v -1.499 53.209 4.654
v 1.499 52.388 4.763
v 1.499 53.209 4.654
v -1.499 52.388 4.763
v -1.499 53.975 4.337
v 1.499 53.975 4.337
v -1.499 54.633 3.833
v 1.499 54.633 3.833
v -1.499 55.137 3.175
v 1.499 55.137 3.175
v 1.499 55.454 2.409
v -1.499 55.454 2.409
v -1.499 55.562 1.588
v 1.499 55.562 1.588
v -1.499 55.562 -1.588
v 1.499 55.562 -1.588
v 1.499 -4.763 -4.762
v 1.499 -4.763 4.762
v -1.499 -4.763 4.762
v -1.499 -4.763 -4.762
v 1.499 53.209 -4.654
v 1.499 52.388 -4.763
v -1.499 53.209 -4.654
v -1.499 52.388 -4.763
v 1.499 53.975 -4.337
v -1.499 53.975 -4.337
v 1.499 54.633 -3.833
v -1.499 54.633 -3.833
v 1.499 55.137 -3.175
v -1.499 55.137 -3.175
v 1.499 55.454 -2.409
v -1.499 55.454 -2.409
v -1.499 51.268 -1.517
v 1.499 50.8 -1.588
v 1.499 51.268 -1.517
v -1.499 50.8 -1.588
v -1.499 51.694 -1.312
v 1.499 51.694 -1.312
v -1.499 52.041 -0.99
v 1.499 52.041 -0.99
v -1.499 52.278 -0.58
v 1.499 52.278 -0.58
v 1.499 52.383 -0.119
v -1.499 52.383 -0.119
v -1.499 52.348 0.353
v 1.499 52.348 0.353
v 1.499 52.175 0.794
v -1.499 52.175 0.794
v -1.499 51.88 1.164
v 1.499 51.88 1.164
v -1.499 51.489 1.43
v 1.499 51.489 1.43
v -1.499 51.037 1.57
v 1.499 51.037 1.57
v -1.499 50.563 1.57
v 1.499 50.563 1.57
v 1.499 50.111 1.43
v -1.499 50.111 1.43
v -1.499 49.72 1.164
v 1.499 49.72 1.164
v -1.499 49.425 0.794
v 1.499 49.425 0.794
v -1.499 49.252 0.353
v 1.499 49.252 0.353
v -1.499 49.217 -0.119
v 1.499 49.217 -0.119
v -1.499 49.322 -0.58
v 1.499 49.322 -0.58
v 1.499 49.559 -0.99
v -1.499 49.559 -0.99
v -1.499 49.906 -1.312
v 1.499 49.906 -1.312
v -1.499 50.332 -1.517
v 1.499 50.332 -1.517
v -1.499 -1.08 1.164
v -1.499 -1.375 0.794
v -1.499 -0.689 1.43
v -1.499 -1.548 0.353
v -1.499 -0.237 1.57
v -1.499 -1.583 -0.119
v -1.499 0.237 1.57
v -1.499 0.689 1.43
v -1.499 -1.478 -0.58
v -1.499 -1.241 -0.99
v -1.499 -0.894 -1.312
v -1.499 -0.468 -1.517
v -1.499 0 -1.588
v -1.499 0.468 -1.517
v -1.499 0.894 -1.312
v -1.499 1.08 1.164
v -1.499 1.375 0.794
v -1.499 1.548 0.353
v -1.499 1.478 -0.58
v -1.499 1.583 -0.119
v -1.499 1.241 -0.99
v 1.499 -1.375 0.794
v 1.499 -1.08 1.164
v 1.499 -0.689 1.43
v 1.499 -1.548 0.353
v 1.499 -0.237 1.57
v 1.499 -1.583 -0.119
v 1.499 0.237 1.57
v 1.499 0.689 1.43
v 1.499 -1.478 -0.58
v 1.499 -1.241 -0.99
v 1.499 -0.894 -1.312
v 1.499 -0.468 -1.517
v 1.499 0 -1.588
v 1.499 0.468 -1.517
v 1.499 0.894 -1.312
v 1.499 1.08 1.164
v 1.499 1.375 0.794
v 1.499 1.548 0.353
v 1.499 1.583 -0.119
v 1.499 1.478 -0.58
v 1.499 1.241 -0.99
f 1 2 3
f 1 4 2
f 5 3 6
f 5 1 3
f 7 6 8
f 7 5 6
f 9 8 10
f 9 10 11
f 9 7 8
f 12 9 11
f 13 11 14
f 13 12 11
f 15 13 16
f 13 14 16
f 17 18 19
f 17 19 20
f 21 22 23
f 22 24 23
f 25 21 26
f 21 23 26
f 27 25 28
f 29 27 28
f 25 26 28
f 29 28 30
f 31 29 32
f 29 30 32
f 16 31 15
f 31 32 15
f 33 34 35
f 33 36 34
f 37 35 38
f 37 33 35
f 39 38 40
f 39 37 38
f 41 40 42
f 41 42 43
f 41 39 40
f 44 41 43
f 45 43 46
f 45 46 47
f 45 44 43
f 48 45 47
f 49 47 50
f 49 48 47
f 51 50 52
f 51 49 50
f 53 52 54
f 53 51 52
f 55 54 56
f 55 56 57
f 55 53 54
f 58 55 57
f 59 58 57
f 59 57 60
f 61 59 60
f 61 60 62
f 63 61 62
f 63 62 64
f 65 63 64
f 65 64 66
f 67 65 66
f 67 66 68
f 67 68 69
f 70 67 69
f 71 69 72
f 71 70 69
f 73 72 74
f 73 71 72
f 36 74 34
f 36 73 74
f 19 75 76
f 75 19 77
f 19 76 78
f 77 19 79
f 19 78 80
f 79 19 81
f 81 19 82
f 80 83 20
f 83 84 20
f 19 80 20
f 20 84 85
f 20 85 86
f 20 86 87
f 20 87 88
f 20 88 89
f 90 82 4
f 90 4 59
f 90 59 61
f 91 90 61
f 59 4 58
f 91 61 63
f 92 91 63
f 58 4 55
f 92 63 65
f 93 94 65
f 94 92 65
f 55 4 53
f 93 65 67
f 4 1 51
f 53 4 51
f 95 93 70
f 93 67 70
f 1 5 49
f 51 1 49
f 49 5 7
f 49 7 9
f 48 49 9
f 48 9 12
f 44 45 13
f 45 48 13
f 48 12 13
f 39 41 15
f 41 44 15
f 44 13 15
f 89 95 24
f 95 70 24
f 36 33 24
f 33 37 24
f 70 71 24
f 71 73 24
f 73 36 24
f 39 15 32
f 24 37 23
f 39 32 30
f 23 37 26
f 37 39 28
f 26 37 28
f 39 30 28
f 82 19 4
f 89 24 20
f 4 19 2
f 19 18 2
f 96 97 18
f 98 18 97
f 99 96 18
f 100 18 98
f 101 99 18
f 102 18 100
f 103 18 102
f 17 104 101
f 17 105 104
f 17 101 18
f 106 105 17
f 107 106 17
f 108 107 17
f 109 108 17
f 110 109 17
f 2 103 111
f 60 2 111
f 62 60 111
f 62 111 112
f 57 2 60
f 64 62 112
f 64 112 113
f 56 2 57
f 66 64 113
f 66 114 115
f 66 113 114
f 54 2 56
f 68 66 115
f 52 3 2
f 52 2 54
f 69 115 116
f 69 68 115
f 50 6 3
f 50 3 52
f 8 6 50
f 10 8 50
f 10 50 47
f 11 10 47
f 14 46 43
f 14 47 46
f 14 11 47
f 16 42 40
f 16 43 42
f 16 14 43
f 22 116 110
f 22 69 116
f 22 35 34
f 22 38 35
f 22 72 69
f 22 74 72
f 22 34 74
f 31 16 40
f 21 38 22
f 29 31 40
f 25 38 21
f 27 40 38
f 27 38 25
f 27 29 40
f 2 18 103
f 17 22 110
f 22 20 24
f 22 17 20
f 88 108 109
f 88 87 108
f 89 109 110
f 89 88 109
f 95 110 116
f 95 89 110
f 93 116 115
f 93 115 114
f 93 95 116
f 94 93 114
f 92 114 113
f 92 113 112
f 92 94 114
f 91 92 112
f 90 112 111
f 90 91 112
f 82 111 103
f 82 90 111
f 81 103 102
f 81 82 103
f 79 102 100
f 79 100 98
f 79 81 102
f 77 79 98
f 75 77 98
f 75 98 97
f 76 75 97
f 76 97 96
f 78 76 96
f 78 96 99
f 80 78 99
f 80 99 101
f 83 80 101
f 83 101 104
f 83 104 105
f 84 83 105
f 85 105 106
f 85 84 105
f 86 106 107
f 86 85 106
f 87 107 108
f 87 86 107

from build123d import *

# Parameters (mm, degrees)
SKETCH1_W      = 9.525
SKETCH1_H      = 60.325
SKETCH1_R      = 1.5875
EXTRUDE1_DEPTH = 1.4986
FILLET1_R      = 3.175


with BuildPart() as part:
    # Sketch1 → Extrude1 (new body, symmetric)
    with BuildSketch(Plane(origin=(0, 0, 0), x_dir=(0, 0, -1), z_dir=(1, 0, 0))):
        with Locations((0, 25.4)):
            Rectangle(SKETCH1_W, SKETCH1_H)
        Circle(SKETCH1_R, mode=Mode.SUBTRACT)
        with Locations((0, 50.8)):
            Circle(SKETCH1_R, mode=Mode.SUBTRACT)
    extrude(amount=EXTRUDE1_DEPTH, both=True)

    # Fillet1
    fillet1_edges = [part.edges().sort_by_distance(p)[0] for p in [
        (0, 55.5625, 4.7625),
        (0, 55.5625, -4.7625),
    ]]
    fillet(fillet1_edges, radius=FILLET1_R)


solid = part.part
